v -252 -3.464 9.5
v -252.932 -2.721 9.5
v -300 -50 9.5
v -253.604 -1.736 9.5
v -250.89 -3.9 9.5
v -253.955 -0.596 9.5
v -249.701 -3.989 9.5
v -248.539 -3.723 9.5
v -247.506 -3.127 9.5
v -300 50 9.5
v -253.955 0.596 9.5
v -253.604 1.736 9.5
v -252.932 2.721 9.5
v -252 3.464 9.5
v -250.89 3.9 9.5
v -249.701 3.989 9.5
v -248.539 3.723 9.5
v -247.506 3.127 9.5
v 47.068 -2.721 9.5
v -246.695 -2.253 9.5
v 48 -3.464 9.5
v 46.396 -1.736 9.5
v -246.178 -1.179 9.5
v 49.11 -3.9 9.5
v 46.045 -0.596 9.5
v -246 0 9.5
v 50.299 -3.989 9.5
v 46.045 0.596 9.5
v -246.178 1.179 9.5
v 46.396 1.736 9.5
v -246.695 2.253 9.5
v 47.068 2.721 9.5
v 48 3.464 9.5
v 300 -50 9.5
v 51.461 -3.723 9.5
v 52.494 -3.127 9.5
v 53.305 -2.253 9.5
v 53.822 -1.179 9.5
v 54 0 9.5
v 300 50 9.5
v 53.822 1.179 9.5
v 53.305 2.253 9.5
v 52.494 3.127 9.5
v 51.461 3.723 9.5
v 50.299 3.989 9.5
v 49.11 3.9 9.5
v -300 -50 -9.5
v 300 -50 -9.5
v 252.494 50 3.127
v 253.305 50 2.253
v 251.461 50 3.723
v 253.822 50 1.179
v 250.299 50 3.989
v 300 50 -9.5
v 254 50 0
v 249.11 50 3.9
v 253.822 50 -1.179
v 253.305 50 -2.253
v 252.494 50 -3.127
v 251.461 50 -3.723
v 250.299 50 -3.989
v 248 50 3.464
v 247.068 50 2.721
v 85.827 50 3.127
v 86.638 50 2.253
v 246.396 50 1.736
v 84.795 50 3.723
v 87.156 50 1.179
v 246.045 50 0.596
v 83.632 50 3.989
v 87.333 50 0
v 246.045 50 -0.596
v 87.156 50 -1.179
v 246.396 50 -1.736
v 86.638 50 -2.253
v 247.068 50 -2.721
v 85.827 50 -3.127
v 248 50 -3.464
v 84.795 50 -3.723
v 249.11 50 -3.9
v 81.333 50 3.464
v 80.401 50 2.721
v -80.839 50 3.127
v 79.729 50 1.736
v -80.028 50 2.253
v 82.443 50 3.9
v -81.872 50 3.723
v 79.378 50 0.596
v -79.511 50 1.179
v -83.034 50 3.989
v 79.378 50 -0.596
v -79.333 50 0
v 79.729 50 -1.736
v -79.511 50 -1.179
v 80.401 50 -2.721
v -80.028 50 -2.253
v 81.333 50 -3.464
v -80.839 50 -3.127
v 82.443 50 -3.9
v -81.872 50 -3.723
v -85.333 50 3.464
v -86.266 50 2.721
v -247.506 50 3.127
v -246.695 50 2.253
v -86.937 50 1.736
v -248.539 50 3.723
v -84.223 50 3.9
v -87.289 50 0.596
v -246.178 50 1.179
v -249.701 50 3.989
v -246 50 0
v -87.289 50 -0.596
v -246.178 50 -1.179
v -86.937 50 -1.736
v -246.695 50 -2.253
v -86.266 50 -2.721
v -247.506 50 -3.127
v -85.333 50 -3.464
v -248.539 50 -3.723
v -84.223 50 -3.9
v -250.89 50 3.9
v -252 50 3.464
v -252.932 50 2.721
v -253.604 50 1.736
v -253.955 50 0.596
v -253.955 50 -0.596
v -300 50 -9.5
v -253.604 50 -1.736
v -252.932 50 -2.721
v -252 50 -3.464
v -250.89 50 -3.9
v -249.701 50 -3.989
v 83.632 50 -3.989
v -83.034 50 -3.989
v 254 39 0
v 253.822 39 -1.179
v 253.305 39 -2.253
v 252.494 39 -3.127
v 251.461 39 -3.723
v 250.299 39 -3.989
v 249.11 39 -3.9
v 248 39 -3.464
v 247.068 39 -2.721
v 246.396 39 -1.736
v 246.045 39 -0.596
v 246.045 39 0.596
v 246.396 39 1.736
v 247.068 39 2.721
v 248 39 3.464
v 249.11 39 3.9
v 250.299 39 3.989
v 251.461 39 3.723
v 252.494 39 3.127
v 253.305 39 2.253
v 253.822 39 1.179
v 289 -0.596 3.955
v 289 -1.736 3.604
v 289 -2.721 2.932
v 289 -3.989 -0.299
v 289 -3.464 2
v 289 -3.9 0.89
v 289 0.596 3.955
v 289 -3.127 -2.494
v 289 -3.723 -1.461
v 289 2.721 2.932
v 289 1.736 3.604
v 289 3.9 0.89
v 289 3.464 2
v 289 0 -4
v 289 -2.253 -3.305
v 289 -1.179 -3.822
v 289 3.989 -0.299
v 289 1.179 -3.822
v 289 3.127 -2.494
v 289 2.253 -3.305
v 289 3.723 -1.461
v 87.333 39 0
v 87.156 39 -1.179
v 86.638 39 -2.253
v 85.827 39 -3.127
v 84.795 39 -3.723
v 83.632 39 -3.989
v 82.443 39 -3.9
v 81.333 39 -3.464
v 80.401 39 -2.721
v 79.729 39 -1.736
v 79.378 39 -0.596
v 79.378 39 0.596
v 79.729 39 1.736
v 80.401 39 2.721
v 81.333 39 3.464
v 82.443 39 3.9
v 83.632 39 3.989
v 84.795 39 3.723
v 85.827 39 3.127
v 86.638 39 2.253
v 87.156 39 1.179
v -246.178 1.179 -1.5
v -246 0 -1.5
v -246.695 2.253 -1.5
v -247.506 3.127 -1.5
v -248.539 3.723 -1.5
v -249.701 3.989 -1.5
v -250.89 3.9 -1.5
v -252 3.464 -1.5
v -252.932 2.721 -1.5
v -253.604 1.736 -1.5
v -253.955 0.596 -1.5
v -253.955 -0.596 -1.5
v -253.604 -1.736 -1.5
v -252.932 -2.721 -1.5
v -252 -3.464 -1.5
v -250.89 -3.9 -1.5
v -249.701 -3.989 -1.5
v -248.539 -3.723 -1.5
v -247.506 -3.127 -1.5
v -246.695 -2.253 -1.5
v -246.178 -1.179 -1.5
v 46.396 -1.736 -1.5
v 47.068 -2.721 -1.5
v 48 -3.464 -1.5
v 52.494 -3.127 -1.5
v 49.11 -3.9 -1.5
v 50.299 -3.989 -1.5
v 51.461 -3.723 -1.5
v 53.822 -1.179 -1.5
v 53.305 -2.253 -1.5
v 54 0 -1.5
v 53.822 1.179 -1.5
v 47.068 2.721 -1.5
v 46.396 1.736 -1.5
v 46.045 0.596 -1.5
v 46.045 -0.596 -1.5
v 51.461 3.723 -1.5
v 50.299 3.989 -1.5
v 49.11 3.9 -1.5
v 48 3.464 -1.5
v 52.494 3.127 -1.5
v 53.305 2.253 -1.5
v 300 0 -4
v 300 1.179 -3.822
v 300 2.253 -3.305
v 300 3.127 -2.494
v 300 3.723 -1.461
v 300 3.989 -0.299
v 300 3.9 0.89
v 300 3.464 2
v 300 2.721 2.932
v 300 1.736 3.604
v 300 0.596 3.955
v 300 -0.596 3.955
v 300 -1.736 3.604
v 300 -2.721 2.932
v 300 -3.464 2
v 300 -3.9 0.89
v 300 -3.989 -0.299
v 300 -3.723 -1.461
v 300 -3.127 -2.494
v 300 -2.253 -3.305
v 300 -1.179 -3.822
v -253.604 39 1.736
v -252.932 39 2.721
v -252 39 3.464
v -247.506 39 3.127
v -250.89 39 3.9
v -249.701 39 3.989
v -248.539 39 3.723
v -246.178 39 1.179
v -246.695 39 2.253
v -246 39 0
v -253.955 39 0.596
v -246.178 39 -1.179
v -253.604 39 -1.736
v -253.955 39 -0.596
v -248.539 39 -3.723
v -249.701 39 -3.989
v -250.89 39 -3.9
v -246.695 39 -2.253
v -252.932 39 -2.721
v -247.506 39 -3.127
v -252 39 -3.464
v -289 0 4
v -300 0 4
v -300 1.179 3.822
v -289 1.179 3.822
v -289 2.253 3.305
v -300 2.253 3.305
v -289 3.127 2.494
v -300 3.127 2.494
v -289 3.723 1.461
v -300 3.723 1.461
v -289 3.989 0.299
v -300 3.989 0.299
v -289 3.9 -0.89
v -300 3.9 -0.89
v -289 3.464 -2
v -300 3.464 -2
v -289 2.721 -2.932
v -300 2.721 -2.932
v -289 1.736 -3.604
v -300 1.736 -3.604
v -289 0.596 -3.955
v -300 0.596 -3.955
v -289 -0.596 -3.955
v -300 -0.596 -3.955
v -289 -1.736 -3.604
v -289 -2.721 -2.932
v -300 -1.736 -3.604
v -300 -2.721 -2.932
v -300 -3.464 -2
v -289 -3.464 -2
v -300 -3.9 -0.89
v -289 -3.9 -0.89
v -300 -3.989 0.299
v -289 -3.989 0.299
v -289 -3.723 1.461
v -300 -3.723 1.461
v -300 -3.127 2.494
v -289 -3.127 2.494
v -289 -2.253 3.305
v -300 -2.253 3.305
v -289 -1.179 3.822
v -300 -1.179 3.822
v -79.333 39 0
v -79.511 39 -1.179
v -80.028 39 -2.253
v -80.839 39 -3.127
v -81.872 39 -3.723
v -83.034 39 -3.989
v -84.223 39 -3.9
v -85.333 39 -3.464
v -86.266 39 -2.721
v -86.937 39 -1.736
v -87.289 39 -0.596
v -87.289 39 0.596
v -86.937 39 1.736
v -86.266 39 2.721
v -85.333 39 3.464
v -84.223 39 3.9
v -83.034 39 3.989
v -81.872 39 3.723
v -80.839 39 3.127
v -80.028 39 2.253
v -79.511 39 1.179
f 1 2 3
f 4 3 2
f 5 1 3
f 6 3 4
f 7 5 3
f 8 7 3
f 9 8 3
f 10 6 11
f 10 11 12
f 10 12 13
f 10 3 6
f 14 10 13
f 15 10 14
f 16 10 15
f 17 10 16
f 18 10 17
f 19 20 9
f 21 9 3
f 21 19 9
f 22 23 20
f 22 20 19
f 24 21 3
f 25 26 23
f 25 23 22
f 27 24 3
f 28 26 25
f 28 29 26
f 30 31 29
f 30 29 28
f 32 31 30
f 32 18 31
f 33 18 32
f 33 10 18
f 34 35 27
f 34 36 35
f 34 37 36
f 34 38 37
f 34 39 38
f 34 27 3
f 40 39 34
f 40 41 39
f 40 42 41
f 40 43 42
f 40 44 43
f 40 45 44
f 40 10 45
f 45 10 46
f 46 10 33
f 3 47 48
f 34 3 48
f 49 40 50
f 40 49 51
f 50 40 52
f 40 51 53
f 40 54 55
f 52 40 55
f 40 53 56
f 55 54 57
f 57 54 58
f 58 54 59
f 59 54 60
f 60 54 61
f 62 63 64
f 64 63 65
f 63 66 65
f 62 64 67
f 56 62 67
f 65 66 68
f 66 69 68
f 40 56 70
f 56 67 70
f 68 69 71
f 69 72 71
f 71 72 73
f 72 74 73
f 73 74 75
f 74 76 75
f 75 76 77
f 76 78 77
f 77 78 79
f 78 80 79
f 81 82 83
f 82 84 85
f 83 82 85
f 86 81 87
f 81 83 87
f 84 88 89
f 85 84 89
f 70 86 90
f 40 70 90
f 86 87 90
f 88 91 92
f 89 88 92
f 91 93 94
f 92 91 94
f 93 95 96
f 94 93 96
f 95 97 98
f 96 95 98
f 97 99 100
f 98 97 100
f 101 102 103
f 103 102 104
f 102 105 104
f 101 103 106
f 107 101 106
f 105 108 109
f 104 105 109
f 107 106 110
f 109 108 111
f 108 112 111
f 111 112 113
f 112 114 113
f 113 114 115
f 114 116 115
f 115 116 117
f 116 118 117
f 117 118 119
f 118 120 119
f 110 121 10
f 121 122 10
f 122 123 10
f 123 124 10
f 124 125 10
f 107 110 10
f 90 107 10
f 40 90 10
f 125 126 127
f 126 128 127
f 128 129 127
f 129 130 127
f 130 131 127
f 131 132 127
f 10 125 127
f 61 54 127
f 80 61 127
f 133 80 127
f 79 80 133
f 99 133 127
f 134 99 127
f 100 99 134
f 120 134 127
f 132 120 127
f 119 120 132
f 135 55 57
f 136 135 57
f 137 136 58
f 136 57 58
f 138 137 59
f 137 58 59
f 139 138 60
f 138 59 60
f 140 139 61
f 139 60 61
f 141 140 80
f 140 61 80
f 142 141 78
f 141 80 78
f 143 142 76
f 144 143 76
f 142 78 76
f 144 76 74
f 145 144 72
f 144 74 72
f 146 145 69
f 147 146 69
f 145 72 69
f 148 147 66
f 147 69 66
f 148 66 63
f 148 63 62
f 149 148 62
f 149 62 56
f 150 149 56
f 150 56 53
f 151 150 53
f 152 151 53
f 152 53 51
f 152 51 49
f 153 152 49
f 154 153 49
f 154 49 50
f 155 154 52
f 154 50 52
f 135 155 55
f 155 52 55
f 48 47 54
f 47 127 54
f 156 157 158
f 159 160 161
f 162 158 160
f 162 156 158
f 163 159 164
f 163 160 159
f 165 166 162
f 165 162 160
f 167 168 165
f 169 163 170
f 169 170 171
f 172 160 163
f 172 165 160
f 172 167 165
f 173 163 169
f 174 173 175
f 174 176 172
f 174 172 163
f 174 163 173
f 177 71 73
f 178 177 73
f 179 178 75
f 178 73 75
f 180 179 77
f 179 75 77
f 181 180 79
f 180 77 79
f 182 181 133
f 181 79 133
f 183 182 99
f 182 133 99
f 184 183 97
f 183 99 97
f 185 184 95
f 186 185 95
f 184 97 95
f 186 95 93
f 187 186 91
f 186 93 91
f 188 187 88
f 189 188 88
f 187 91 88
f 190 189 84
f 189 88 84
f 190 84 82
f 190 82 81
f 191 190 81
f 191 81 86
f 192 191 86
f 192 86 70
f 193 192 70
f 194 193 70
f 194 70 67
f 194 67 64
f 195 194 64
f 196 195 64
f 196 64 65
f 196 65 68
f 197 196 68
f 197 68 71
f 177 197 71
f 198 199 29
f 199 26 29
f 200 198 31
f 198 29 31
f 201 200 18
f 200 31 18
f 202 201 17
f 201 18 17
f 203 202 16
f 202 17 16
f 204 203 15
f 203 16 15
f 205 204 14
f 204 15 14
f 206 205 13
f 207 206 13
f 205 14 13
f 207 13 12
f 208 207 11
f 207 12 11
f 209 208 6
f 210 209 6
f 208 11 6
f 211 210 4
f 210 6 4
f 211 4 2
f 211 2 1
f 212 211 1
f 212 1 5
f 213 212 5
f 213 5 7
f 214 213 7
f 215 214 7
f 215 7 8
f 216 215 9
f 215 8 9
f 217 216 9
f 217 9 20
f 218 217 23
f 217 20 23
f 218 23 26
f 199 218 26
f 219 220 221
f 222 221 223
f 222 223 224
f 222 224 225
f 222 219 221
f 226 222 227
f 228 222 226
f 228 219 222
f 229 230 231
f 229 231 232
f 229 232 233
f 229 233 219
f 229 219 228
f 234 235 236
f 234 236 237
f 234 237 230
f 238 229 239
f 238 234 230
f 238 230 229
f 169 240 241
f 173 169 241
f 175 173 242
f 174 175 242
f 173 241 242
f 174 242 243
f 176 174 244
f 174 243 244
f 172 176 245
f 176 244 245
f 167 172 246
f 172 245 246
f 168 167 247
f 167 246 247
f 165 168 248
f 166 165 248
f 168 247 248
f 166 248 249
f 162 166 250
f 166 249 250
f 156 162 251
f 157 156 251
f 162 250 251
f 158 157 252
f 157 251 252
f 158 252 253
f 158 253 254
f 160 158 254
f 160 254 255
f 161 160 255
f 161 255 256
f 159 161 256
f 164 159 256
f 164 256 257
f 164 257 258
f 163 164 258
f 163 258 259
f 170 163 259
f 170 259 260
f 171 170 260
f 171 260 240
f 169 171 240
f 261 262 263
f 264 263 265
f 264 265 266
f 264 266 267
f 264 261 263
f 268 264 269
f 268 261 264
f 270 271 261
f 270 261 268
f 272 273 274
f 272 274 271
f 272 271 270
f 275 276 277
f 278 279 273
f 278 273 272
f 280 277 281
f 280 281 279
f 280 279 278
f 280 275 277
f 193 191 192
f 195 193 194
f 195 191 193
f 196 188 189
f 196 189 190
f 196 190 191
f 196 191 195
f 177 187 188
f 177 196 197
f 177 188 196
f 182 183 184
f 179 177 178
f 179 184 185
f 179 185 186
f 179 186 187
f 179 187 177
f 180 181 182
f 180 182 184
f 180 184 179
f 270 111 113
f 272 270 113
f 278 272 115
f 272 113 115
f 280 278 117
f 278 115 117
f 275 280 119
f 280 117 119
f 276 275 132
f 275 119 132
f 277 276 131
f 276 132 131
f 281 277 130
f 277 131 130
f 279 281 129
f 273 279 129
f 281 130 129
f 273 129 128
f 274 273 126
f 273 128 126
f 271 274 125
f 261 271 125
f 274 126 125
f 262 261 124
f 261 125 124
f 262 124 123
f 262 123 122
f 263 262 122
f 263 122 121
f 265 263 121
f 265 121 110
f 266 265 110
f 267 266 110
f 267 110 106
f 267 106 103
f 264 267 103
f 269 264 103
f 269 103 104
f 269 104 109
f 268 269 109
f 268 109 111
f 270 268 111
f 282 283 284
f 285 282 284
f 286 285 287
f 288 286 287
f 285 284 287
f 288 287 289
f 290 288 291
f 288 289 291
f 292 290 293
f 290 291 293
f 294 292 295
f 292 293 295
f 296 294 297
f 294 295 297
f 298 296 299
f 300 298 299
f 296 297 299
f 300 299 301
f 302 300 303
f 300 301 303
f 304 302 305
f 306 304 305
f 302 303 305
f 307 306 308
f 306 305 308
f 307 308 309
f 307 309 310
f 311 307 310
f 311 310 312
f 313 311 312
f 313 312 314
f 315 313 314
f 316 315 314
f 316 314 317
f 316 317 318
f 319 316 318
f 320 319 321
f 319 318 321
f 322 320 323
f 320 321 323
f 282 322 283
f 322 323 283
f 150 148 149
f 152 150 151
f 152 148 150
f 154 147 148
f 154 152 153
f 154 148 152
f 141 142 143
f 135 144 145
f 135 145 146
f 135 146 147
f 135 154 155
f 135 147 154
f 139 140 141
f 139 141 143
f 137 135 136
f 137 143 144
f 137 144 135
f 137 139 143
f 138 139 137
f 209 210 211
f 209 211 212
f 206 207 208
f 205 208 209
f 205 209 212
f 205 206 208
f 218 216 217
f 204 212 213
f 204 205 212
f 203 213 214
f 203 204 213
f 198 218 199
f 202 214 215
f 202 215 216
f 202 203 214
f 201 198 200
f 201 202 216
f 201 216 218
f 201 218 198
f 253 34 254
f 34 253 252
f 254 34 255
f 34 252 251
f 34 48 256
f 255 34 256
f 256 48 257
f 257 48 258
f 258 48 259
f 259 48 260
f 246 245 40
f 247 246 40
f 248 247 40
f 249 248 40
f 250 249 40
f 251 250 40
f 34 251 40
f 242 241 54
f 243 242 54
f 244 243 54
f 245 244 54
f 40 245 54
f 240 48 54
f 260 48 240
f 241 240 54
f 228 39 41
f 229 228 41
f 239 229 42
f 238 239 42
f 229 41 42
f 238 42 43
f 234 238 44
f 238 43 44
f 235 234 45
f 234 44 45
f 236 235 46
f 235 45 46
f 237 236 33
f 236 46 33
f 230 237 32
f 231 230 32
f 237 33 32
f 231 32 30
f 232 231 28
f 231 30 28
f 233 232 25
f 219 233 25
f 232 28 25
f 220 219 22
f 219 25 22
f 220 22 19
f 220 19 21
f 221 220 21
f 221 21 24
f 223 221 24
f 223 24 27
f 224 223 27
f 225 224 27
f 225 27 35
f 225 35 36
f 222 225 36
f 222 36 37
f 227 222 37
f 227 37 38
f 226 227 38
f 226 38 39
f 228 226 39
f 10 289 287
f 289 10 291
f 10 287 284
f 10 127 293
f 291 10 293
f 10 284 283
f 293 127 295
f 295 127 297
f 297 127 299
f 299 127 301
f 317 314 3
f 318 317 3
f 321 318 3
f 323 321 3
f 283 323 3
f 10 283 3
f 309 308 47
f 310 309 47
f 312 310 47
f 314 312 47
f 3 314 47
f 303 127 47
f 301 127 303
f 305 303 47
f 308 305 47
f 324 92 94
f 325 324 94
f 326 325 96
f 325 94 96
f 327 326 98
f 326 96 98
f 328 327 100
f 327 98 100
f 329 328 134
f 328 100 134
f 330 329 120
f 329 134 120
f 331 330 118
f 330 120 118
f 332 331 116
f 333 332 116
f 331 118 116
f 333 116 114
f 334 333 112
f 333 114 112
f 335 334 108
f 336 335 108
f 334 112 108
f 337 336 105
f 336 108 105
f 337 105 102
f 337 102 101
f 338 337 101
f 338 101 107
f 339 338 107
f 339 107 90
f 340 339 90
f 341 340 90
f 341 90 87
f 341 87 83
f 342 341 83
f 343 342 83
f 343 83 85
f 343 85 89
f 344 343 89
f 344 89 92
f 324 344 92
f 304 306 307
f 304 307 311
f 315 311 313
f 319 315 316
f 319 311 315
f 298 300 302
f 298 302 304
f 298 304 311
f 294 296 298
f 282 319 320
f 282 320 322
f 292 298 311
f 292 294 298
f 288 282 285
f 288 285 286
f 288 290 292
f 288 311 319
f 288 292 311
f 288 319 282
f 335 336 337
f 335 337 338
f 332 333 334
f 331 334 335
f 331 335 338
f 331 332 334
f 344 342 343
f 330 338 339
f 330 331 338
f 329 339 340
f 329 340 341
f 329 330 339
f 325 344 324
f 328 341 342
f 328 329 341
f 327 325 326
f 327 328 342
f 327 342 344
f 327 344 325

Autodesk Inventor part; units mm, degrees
ref_plane "YZ Plane" through (0, 0, 0) normal (1, 0, 0) x (0, 1, 0)
ref_plane "XZ Plane" through (0, 0, 0) normal (0, 1, 0) x (-1, 0, 0)
ref_plane "XY Plane" through (0, 0, 0) normal (0, 0, 1) x (1, 0, 0)
sketch "Sketch1" plane through (0, 0, 0) normal (0, 0, 1) x (1, 0, 0)
  line L0 (300, 50) -> (-300, 50)
  line L1 (-300, 50) -> (-300, -50)
  line L2 (-300, -50) -> (300, -50)
  line L3 (300, -50) -> (300, 50)
  line L4 (300, 50) -> (-300, -50) construction
  line L5 (-300, 50) -> (300, -50) construction
  point P0 (0, 0)
  dimension "d0" = 600
  dimension "d1" = 100
extrude "Extrusion1" add sketch "Sketch1" along normal mid plane 19
sketch "Sketch2" plane through (0, 0, 9.5) normal (0, 0, 1) x (1, 0, 0)
  line L0 (-300, 50) -> (-300, -50) projected
  line L1 (-300, 0) -> (-250, 0)
  line L2 (300, -50) -> (300, 50) projected
  line L3 (300, 0) -> (50, 0)
  circle A0 centre (-250, 0) radius 4
  circle A1 centre (50, 0) radius 4
  point P0 (0, 0)
  dimension "d4" = 50
  dimension "d5" = 250
  dimension "d6" = 8
  dimension "d7" = 8
extrude "Extrusion2" cut sketch "Sketch2" against normal blind 11
sketch "Sketch3" plane through (-300, 50, 9.5) normal (0, 1, 0) x (1, 0, 0)
  line L0 (0, 19) -> (0, 0) projected
  line L1 (0, 9.5) -> (50, 9.5)
  line L2 (50, 9.5) -> (216.6667, 9.5)
  line L3 (216.6667, 9.5) -> (383.3333, 9.5)
  line L4 (383.3333, 9.5) -> (550, 9.5)
  line L5 (550, 9.5) -> (600, 9.5)
  circle A0 centre (50, 9.5) radius 4
  circle A1 centre (216.6667, 9.5) radius 4
  circle A2 centre (383.3333, 9.5) radius 4
  circle A3 centre (550, 9.5) radius 4
  point P0 (300, 9.5)
  dimension "d10" = 50
  dimension "d11" = 166.6667
  dimension "d12" = 166.6667
  dimension "d13" = 166.6667
  dimension "d14" = 50
  dimension "d15" = 8
  dimension "d16" = 8
  dimension "d17" = 8
  dimension "d18" = 8
extrude "Extrusion3" cut sketch "Sketch3" against normal blind 11
sketch "Sketch4" plane through (300, -50, 9.5) normal (1, 0, 0) x (0, 0, -1)
  circle A0 centre (9.5, 50) radius 4
  dimension "d21" = 8
extrude "Extrusion4" cut sketch "Sketch4" against normal blind 11
sketch "Sketch5" plane through (-300, -50, 9.5) normal (-1, 0, 0) x (0, 0, 1)
  circle A0 centre (-9.5, 50) radius 4
  dimension "d24" = 8
extrude "Extrusion5" cut sketch "Sketch5" against normal blind 11
properties part number "D"
